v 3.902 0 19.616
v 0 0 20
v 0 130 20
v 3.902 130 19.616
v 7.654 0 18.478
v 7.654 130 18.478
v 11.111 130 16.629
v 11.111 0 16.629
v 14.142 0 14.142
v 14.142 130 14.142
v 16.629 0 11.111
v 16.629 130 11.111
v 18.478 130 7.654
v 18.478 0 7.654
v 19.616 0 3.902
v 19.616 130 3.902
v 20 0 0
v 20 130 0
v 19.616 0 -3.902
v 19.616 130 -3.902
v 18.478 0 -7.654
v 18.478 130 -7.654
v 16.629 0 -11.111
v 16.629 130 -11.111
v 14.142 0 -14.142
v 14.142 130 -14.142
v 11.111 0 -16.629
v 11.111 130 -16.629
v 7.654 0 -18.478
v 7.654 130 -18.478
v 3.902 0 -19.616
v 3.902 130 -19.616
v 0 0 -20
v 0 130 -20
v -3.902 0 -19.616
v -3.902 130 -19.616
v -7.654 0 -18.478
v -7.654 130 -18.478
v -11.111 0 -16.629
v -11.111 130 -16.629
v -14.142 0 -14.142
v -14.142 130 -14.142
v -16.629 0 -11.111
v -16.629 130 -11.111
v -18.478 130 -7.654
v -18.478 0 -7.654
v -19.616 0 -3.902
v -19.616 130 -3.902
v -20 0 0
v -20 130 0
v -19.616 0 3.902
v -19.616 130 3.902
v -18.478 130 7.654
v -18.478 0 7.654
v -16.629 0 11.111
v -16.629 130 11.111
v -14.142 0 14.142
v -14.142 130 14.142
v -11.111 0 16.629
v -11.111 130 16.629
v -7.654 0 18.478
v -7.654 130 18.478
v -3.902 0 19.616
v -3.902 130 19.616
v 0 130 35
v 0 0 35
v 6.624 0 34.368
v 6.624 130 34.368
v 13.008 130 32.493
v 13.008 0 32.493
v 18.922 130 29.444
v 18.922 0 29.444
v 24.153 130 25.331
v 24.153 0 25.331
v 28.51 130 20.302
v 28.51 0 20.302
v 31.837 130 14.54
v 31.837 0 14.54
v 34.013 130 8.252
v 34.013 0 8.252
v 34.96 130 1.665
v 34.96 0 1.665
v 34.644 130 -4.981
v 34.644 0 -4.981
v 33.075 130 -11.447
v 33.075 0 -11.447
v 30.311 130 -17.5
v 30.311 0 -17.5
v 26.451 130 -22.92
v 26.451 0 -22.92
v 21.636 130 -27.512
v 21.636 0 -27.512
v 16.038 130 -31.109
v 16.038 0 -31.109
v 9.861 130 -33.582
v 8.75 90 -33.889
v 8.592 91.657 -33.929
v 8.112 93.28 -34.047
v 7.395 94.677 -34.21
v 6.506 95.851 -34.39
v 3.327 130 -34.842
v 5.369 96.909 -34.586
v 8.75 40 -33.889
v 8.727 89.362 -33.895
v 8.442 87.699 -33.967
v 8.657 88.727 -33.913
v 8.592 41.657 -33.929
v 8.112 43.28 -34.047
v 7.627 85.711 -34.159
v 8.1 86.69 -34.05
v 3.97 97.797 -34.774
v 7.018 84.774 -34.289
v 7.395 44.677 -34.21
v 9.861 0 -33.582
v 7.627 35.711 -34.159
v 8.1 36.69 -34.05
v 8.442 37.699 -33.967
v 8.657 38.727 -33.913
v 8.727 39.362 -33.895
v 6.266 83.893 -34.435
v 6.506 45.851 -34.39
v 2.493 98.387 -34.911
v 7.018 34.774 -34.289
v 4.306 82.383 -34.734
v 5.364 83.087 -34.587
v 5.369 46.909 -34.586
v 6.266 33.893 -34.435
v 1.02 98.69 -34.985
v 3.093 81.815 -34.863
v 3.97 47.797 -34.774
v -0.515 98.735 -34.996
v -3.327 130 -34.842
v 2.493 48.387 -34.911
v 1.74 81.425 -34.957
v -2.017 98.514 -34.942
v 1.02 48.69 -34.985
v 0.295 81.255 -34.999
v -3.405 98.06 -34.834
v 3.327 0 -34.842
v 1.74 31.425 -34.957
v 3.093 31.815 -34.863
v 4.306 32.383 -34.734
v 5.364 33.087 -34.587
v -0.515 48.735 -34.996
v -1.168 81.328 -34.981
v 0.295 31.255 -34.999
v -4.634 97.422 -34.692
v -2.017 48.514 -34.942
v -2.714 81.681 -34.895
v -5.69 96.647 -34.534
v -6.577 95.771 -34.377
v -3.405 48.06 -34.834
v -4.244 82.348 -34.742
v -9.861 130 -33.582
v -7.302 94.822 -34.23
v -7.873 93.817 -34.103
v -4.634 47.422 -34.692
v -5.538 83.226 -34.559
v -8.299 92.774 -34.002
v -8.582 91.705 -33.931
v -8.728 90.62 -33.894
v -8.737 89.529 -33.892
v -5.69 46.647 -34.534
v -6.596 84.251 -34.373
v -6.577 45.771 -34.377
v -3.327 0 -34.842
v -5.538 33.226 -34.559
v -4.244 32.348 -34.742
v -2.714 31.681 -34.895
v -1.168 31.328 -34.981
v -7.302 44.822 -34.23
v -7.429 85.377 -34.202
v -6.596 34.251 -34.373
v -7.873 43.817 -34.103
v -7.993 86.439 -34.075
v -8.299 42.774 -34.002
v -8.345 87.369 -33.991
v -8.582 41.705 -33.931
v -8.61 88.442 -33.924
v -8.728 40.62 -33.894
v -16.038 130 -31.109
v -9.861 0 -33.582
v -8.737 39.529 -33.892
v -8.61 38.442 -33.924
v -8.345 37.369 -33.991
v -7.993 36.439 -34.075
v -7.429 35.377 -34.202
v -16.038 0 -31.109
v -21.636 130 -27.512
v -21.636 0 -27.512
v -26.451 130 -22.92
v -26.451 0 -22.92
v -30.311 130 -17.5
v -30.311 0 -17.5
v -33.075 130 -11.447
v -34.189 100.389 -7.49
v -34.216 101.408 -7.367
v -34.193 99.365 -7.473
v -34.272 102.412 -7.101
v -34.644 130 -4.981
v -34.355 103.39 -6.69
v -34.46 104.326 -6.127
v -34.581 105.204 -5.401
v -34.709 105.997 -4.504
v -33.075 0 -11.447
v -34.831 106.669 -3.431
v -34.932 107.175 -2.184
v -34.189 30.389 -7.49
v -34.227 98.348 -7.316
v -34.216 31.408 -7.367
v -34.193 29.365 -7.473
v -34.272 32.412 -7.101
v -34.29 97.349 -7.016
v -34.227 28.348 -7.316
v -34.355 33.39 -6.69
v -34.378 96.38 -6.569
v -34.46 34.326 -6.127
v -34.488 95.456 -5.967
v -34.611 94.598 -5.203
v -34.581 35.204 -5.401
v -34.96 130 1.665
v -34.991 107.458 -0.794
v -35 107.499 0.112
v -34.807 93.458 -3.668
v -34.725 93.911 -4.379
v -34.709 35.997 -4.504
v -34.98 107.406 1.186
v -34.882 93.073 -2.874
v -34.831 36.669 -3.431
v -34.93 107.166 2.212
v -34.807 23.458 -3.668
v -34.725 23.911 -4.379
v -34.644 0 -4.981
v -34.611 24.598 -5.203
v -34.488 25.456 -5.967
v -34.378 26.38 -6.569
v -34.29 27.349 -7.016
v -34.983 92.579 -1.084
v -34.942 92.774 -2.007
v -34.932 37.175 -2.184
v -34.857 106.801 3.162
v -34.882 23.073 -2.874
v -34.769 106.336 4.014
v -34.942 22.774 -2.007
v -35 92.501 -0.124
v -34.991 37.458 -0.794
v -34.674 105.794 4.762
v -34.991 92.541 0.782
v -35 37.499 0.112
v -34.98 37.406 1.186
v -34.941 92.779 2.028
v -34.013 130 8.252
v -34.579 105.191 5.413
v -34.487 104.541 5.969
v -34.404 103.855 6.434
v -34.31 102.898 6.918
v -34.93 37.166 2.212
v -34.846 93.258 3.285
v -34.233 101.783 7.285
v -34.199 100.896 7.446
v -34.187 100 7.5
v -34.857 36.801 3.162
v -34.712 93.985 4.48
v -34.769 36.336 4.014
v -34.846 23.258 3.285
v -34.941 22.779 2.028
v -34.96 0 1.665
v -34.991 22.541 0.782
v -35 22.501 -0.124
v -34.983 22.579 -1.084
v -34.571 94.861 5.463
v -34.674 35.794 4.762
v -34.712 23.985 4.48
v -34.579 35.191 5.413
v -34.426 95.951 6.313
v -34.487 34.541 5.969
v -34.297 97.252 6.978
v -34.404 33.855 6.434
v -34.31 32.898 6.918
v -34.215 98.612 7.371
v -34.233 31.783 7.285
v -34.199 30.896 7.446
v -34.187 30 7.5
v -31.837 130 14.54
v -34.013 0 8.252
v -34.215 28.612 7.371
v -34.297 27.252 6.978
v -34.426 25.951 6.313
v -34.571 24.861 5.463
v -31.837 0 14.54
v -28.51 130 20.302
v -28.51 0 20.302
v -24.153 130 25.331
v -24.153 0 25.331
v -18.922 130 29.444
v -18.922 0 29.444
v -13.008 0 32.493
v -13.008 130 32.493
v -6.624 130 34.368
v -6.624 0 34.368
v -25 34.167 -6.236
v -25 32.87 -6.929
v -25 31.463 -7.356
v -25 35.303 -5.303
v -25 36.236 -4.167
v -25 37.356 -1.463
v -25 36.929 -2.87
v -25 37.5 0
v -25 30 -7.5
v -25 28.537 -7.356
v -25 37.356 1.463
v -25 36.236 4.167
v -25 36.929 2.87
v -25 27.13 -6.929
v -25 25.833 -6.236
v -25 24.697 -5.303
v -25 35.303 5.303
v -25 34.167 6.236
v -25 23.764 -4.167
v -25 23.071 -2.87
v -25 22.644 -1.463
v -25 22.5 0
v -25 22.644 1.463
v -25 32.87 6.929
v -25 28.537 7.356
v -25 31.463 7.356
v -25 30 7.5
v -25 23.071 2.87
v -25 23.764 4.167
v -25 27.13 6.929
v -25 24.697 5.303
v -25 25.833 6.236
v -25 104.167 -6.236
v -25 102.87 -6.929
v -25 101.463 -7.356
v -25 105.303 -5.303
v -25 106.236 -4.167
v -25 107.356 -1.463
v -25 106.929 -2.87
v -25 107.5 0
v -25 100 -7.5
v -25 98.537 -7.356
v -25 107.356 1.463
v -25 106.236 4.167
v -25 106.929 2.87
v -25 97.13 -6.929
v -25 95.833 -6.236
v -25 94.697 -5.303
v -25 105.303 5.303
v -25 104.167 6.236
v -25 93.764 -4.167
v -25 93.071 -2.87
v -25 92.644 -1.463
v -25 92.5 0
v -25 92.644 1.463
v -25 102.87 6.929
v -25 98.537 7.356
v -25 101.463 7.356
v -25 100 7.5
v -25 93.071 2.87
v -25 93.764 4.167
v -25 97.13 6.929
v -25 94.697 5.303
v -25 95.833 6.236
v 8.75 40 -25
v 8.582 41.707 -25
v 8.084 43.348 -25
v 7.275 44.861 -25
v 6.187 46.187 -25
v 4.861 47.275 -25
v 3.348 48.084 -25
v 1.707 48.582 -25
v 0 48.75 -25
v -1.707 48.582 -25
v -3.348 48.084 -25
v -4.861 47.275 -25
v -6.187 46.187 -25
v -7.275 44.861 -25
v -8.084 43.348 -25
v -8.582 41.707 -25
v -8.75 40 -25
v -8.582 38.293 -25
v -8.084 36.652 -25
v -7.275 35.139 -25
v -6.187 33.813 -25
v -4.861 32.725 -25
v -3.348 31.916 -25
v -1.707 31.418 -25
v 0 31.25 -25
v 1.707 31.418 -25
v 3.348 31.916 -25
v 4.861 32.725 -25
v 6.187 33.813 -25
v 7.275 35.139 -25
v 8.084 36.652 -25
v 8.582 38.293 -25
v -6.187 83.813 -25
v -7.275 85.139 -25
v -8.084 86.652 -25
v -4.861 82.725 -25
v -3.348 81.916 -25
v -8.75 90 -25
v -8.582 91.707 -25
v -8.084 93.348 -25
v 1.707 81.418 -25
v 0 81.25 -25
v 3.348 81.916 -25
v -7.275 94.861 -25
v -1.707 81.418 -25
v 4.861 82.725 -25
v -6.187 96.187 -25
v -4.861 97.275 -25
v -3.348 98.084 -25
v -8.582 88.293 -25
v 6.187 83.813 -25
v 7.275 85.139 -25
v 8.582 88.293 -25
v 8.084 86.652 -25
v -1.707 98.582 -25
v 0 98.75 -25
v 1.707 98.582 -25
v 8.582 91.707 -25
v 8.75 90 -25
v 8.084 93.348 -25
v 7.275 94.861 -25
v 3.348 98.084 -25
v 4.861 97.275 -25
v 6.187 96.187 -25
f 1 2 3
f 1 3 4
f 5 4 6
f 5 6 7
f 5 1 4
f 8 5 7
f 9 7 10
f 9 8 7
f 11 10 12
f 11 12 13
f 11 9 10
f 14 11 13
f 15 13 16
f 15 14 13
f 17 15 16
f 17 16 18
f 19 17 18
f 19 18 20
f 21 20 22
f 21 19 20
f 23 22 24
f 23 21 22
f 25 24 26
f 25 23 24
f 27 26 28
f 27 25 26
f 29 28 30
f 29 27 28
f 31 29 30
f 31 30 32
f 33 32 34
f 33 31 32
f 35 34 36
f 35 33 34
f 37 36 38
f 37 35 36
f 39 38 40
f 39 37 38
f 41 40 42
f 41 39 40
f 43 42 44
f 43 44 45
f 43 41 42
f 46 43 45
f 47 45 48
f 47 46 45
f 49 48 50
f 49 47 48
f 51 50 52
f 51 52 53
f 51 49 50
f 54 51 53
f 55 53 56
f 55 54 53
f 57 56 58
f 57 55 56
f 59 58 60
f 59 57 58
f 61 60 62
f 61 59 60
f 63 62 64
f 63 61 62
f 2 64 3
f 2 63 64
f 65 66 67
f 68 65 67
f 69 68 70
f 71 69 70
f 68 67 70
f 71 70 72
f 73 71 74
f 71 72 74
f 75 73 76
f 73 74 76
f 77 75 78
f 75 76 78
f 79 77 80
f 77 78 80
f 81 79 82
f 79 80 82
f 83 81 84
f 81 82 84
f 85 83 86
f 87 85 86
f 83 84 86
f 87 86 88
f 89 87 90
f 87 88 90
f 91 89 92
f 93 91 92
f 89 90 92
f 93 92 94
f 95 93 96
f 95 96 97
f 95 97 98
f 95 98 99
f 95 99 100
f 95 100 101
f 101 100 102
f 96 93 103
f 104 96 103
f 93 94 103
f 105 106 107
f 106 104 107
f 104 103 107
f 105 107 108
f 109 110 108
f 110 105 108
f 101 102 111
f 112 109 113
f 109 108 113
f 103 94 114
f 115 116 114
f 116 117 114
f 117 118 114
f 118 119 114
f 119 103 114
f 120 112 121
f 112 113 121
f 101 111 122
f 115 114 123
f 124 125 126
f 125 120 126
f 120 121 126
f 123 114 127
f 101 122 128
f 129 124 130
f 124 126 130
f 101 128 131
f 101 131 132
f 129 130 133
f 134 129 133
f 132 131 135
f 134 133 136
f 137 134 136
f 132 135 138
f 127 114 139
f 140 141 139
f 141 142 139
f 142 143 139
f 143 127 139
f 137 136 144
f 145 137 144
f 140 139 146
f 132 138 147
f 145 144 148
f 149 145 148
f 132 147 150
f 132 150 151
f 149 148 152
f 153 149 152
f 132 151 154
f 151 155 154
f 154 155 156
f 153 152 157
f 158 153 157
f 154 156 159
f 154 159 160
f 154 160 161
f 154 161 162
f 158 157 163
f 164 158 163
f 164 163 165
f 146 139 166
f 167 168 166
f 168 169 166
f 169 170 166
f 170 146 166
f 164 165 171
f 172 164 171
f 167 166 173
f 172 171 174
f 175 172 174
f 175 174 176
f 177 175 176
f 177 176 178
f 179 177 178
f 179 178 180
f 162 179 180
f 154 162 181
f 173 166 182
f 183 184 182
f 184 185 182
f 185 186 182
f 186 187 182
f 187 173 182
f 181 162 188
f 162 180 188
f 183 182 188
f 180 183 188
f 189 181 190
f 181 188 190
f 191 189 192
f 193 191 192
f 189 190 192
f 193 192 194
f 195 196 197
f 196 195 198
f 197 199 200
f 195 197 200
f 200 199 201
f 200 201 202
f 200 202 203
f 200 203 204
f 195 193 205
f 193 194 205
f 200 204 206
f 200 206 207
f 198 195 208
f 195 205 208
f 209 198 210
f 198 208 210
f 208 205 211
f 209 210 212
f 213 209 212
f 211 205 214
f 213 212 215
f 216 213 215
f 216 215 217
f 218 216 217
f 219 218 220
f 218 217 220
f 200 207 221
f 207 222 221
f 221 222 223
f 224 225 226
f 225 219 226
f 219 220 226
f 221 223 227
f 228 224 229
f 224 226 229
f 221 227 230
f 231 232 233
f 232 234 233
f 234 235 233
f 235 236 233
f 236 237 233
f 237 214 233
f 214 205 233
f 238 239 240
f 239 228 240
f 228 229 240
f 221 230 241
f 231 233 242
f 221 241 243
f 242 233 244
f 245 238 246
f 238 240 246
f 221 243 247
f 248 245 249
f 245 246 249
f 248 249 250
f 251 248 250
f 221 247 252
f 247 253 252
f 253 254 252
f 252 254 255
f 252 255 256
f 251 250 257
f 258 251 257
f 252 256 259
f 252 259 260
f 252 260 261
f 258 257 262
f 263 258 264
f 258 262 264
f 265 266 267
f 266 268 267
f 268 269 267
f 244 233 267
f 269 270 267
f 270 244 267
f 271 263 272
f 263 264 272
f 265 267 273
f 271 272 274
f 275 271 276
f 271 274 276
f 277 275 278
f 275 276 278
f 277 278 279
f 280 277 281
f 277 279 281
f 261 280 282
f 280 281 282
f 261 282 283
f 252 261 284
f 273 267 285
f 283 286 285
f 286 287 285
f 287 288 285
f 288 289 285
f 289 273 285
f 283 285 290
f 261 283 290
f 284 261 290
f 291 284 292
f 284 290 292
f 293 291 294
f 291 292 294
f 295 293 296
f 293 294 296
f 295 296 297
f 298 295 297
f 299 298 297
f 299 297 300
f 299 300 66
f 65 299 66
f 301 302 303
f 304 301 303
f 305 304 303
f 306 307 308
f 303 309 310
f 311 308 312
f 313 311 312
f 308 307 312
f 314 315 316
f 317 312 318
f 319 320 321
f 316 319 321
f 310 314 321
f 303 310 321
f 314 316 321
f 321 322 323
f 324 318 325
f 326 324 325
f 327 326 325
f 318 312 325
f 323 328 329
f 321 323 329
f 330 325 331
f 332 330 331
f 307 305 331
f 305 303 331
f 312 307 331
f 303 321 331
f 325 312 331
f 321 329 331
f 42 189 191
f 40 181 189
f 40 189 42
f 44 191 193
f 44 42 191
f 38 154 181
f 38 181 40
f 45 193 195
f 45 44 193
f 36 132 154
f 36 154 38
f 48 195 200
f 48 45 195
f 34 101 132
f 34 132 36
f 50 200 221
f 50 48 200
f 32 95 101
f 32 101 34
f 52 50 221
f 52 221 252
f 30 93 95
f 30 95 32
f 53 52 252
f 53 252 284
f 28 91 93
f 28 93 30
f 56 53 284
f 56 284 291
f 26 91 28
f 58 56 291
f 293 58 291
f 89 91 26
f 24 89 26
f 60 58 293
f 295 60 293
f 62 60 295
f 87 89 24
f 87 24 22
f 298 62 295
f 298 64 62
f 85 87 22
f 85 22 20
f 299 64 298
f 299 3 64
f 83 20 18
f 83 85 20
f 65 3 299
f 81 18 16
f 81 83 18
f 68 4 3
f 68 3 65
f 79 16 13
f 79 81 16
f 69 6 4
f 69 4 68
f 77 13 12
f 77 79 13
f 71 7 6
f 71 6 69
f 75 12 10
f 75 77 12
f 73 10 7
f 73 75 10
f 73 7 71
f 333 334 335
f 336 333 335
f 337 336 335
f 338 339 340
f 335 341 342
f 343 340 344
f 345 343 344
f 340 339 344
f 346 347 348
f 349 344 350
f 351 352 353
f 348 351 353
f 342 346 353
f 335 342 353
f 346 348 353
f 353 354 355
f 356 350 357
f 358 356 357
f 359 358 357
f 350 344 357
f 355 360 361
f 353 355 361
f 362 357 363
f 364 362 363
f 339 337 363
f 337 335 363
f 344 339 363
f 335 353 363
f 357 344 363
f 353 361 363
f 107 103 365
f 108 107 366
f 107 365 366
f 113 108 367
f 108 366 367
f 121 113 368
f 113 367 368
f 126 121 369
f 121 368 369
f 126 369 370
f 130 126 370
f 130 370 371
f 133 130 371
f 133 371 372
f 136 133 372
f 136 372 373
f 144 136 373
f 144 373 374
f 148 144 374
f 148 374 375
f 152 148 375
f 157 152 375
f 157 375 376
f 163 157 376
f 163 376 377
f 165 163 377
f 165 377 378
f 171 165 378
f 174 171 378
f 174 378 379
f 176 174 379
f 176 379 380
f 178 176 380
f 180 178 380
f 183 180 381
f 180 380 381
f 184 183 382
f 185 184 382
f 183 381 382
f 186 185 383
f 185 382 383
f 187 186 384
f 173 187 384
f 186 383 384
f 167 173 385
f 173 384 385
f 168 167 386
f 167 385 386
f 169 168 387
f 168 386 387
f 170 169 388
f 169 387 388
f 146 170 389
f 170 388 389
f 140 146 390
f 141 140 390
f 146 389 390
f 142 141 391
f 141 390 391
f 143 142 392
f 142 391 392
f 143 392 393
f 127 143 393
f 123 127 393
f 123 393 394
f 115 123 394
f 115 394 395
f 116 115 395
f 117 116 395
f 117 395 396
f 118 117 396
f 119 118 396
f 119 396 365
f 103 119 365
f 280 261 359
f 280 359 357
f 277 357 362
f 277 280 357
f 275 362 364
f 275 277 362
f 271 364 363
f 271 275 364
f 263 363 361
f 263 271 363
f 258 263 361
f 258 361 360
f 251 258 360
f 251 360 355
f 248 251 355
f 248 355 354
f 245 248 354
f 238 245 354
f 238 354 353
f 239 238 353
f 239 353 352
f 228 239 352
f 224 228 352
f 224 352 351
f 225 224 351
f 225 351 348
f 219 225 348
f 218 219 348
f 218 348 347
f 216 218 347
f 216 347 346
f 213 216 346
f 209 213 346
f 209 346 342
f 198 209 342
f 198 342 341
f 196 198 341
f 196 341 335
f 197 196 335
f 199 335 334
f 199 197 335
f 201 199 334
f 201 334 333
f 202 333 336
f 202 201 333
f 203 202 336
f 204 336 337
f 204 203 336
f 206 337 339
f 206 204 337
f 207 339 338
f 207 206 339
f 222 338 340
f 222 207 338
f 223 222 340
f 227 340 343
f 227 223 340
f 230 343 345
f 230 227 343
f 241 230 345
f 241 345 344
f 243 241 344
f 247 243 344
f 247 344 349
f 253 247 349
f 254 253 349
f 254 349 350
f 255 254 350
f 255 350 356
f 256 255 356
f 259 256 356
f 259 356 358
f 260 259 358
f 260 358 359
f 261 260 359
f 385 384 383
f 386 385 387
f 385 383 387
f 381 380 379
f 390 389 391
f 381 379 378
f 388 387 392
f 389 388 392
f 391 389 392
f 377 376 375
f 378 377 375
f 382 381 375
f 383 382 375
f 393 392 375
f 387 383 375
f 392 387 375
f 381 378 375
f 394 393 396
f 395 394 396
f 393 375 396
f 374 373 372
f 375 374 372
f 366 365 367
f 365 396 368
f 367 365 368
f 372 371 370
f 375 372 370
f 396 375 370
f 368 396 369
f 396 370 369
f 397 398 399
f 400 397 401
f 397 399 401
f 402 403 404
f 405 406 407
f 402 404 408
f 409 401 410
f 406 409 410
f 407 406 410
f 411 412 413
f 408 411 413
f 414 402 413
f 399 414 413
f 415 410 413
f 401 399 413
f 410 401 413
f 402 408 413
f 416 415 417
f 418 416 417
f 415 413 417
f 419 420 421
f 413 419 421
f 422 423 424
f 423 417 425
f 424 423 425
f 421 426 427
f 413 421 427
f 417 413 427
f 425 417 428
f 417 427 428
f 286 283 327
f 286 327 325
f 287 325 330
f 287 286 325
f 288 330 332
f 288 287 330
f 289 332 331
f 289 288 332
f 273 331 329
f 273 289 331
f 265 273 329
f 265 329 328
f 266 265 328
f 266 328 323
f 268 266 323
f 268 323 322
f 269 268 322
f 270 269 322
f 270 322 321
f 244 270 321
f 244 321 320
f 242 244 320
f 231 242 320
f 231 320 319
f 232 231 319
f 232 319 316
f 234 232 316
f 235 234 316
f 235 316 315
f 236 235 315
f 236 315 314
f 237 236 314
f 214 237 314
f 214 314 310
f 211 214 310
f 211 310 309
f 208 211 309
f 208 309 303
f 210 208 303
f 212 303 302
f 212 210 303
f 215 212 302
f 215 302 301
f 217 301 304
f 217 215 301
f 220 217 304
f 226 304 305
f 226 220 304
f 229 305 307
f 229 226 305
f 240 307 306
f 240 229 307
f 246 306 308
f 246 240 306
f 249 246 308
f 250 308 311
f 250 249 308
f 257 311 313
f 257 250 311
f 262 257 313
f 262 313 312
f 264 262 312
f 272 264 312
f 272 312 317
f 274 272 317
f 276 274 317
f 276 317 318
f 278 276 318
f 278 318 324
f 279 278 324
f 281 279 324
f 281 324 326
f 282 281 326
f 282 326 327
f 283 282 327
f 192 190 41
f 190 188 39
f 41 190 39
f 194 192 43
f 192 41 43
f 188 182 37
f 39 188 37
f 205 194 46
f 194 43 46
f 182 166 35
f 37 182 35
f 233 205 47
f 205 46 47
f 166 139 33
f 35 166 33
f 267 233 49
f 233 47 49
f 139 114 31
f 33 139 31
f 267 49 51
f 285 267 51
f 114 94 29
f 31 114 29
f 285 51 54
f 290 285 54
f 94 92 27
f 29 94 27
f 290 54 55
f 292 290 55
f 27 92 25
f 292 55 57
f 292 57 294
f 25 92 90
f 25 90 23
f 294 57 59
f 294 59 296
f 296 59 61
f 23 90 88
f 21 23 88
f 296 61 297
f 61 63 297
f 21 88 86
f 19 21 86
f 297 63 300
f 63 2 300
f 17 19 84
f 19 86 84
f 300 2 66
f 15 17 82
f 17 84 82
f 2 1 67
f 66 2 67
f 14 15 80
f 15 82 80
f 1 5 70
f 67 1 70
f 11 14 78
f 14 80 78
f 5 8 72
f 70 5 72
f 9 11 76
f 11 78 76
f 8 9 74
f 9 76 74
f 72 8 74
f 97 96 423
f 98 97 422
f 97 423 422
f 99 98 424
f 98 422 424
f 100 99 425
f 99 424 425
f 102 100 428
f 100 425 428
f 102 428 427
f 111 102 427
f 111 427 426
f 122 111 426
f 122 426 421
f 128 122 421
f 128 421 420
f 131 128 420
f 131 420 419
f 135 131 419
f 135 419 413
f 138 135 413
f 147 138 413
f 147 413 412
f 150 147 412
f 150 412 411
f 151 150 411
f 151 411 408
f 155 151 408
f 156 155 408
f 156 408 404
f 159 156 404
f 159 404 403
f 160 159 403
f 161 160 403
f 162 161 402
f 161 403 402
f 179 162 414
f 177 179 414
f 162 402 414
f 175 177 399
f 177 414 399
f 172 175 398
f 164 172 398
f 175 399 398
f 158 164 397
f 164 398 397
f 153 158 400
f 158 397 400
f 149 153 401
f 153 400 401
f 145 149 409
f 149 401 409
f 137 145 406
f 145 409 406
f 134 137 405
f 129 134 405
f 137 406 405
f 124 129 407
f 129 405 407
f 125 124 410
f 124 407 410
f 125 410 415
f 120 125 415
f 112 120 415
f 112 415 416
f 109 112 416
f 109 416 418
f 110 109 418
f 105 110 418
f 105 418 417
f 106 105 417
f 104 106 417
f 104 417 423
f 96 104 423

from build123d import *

# Parameters (mm, degrees)
ESQUISSE1_R             = 35
ESQUISSE1_R_2           = 20
BOSS_EXTRU_1_DEPTH      = 130
ENL_V_START             = -25
ESQUISSE2_R             = 8.75
ENL_V_MAT_EXTRU_1_DEPTH = 100
ESQUISSE3_R             = 7.5
ENL_V_MAT_EXTRU_2_DEPTH = 10


with BuildPart() as part:
    # Esquisse1 → Boss.-Extru.1 (new body)
    with BuildSketch(Plane(origin=(0, 0, 0), x_dir=(1, 0, 0), z_dir=(0, 1, 0))):
        with Locations(Location((0, 0, 0), (0, 0, 270))):
            Circle(ESQUISSE1_R)
        with Locations(Location((0, 0, 0), (0, 0, 270))):
            Circle(ESQUISSE1_R_2, mode=Mode.SUBTRACT)
    extrude(amount=BOSS_EXTRU_1_DEPTH)

    # Esquisse2 → Enlèv. mat.-Extru.1 (cut)
    with BuildSketch(Plane.XY.offset(ENL_V_START)):
        with Locations((0, 90)):
            Circle(ESQUISSE2_R)
        with Locations((0, 40)):
            Circle(ESQUISSE2_R)
    extrude(amount=-ENL_V_MAT_EXTRU_1_DEPTH, mode=Mode.SUBTRACT)

    # Esquisse3 → Enlèv. mat.-Extru.2 (cut)
    with BuildSketch(Plane(origin=(-35, 0, 0), x_dir=(0, 0, -1), z_dir=(1, 0, 0))):
        with Locations(Location((0, 100, 0), (0, 0, 180))):
            Circle(ESQUISSE3_R)
        with Locations(Location((0, 30, 0), (0, 0, 180))):
            Circle(ESQUISSE3_R)
    extrude(amount=ENL_V_MAT_EXTRU_2_DEPTH, mode=Mode.SUBTRACT)


solid = part.part
